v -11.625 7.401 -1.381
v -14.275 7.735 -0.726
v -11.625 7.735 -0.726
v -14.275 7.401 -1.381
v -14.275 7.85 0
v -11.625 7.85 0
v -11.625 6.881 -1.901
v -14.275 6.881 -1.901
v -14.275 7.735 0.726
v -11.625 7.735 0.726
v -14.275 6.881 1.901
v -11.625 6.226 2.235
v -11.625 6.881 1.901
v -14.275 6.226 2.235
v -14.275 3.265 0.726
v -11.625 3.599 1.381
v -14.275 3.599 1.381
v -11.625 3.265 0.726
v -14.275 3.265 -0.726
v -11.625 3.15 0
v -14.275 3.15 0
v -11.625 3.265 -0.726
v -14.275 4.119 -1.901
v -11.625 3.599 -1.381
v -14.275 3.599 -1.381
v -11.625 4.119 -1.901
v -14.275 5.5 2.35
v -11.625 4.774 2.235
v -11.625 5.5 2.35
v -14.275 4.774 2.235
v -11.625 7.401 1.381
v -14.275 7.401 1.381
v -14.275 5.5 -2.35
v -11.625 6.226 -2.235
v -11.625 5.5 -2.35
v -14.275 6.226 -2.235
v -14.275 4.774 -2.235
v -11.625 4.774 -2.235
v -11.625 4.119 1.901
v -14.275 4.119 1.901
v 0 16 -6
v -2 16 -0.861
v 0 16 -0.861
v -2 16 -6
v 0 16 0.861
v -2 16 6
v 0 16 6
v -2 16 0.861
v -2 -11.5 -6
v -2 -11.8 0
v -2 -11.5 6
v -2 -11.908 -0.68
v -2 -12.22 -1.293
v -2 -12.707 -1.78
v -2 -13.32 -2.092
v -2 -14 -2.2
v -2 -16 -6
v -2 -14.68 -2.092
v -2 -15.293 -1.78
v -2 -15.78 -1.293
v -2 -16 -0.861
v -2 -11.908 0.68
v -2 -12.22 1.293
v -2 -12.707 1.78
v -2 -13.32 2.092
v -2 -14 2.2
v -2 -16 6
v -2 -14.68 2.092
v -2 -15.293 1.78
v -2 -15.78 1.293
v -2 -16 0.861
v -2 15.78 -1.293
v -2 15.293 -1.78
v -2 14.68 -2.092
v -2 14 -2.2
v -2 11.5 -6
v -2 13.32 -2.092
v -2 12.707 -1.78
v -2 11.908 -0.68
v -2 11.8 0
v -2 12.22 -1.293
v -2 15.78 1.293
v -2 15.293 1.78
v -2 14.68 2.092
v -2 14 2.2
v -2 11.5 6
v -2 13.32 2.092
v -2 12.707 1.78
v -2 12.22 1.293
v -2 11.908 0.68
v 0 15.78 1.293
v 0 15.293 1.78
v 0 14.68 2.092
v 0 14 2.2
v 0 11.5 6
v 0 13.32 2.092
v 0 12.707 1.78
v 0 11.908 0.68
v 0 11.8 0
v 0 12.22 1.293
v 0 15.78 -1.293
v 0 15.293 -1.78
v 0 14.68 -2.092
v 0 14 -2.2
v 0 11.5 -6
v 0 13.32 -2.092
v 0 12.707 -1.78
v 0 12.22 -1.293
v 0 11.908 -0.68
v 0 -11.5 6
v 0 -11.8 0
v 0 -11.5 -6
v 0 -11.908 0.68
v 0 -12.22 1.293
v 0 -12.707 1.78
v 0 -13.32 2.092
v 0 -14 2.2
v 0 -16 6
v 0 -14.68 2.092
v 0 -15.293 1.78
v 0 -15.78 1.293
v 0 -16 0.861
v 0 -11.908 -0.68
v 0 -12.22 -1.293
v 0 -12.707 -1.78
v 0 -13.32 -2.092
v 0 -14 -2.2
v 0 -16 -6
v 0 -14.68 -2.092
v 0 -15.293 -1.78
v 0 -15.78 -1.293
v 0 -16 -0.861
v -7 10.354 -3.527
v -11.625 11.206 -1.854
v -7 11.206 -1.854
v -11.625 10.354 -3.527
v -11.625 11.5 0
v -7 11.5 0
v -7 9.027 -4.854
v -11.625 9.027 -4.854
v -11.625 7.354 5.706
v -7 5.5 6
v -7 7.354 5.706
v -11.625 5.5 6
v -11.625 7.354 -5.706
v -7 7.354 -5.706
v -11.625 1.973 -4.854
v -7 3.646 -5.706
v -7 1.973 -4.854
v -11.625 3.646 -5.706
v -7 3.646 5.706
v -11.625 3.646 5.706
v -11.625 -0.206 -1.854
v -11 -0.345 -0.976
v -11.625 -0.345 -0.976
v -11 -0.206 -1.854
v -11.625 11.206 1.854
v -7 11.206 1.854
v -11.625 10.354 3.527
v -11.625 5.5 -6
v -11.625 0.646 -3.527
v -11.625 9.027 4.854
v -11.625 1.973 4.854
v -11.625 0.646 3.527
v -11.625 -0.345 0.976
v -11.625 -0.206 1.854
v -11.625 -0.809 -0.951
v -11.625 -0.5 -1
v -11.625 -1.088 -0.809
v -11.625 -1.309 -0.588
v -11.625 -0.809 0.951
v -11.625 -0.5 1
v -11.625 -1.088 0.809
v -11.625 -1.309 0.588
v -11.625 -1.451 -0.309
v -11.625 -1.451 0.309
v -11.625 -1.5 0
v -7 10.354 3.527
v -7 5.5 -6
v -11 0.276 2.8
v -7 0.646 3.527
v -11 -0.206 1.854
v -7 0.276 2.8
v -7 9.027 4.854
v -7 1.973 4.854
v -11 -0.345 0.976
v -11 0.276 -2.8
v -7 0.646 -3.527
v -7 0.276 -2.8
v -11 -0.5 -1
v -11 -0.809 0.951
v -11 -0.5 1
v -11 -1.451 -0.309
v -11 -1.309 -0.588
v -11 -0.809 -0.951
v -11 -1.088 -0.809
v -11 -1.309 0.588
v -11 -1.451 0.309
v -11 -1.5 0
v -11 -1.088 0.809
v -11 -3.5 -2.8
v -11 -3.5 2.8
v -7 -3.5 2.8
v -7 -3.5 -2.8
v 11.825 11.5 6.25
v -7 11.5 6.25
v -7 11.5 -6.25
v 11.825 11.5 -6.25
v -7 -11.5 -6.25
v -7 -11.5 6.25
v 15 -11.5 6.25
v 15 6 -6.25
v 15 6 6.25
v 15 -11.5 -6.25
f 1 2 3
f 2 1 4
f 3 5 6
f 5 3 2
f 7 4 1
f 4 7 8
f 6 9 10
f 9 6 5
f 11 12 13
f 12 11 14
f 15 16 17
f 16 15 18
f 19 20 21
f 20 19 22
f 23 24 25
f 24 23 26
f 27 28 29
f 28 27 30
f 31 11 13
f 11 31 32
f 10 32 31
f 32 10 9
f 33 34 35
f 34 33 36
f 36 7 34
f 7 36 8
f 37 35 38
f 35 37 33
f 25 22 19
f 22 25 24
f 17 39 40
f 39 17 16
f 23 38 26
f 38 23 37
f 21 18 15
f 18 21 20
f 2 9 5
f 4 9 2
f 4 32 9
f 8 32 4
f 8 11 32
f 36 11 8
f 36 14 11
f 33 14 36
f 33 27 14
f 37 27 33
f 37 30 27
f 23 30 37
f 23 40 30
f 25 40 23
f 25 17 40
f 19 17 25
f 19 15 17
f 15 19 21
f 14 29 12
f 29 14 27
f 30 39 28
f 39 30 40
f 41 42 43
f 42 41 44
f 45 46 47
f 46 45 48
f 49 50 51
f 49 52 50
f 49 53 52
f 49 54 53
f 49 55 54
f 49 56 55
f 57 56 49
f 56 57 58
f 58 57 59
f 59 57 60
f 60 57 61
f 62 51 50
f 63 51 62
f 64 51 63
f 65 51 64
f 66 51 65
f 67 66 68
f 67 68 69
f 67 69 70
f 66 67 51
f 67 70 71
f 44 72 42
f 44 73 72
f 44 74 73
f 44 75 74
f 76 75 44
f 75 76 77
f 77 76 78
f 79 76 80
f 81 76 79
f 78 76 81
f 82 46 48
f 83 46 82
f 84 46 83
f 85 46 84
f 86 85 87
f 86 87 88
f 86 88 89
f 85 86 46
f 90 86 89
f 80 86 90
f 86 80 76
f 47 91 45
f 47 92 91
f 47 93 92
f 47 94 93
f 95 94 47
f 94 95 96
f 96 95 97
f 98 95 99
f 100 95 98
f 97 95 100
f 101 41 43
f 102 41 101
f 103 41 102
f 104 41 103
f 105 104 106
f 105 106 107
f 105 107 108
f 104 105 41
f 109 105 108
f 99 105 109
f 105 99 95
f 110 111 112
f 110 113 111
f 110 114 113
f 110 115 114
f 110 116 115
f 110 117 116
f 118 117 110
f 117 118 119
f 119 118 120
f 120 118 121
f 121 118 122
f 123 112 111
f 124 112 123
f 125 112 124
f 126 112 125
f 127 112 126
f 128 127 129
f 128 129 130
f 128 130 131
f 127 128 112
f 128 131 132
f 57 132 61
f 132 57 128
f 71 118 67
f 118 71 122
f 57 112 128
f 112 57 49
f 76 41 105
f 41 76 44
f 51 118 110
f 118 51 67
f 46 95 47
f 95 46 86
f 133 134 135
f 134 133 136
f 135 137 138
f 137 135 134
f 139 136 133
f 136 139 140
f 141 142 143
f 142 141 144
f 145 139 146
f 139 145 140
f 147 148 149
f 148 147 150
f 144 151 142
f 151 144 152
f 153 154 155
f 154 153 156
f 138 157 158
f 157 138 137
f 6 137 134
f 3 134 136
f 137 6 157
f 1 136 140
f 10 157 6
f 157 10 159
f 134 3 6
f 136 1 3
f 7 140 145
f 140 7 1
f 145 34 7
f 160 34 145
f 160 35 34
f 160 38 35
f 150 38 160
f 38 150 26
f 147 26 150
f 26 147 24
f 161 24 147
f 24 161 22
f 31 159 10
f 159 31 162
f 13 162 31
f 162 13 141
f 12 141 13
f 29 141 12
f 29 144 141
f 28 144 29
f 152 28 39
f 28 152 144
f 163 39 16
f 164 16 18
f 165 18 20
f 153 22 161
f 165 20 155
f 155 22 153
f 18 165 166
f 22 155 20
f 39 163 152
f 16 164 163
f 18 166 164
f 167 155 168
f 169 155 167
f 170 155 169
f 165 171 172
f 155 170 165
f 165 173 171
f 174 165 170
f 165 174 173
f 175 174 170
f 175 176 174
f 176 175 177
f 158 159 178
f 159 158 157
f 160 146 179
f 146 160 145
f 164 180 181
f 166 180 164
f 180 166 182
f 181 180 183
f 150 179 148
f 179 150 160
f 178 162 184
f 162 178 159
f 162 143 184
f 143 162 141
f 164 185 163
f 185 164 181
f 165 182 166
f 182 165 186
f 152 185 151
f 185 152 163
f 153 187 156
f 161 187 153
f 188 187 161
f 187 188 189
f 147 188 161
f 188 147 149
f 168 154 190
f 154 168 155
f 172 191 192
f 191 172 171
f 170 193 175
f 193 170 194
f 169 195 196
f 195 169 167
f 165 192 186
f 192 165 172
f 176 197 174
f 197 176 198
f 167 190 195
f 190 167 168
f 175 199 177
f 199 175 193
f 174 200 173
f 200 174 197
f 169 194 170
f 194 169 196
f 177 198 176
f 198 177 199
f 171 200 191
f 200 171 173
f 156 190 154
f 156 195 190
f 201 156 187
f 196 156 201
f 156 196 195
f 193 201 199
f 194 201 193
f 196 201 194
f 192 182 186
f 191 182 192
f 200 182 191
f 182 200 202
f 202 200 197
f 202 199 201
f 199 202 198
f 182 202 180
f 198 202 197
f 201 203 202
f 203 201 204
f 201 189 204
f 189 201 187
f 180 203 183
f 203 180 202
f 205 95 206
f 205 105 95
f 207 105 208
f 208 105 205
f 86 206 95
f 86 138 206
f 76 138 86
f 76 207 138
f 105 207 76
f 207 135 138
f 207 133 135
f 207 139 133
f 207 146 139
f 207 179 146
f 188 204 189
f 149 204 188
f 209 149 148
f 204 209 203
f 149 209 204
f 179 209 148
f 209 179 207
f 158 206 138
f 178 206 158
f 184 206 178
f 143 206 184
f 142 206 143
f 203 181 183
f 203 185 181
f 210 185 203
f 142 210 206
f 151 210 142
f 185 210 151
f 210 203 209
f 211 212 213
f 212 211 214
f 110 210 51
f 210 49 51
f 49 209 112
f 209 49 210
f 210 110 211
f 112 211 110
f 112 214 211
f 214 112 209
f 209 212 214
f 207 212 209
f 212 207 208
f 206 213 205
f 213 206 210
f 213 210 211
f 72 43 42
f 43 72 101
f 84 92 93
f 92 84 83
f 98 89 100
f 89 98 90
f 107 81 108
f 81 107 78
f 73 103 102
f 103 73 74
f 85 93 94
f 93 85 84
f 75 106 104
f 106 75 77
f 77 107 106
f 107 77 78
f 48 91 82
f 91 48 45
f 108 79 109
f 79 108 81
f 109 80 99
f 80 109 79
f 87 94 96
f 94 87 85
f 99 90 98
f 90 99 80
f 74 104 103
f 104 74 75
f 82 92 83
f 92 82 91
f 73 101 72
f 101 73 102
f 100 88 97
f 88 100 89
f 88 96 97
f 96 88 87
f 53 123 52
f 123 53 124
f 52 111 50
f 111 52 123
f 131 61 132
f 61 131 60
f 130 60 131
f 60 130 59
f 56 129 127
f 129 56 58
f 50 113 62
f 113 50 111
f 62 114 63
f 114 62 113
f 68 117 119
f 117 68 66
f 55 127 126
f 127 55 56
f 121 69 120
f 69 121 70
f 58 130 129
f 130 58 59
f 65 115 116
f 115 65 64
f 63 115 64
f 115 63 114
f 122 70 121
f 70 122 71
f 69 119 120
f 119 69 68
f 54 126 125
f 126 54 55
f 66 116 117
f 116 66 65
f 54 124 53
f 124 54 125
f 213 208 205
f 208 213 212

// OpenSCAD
/* 

9G Servo in OpenSCAD by TheCase on Thingiverse: https://www.thingiverse.com/thing:29734

This thing was started by Thingiverse user TheCase, and is licensed under cc.

The origin for the received object is the center of the main block, 
and there was no easy way to determine where to mount the servo and 
install a servo horn.


Usage: 

    use <9g_servo.scad>




*/

* 9g_motor();

function 9g_motor() = 
    let(
        tran_sprkt = [5.5,0,3.65],
        sprkt_h = 29.25,
        tran_sprkt_top = [0, 0, sprkt_h/2],
        tran_mnt = [0,0,5],
        thick_mnt = 2,
        size_mnt = [32,12,thick_mnt],
        size_body = [23,12.5,22],
        offset_sprkt_origin = -(tran_sprkt + tran_sprkt_top),
        offset_mnt = -[0, 0, thick_mnt/2 ],
        tran_mnt_cl =  offset_sprkt_origin + tran_mnt - [0, 0, thick_mnt/2 ]
    ) 
    
[
    [
        ["offset_for_sprocket_origin", offset_sprkt_origin],
        ["mount_cl_bottom_translation", tran_mnt_cl]
    ],
    [
        ["sprocket_translation", tran_sprkt],
        ["sprocket_height", sprkt_h],
        ["mounting_translation", tran_mnt],
        ["mounting_size", size_mnt],
        ["body_size", size_body],
    ]   
];


* 9g_motor_sprocket_at_origin();

module 9g_motor_sprocket_at_origin() {
    offset_for_sprocket_orgin = 9g_motor()[0][0][1];
    tran_mnt_cl = 9g_motor()[0][1][1];
    color("black") translate(tran_mnt_cl) sphere(1);
    color("green", alpha=0.5)  translate(offset_for_sprocket_orgin)  9g_motor();  
}




module 9g_motor_centered_for_mounting() {
    t_mnt = 9g_motor()[1][2][1] ;
    s_mnt = 9g_motor()[1][3][1];
    rotate([-90,0,90]) 
        translate(-t_mnt+[0,0,s_mnt.z/2] ) 9g_motor();  
}

9g_motor_centered_for_mounting();

module 9g_motor(alpha=1){
    body_color = "SteelBlue";
    sprocket_color = "white";
    t_sprkt = 9g_motor()[1][0][1];
    h_sprkt = 9g_motor()[1][1][1];
    t_mnt = 9g_motor()[1][2][1];
    s_mnt = 9g_motor()[1][3][1];
    s_body = 9g_motor()[1][4][1];
    
	difference(){			
		union(){
			color(sprocket_color) translate(t_sprkt) cylinder(r=2.35, h=h_sprkt, $fn=20, center=true);
			color(body_color, alpha=alpha) translate(t_mnt) cube(s_mnt, center=true);
			color(body_color, alpha=alpha) translate([5.5,0,2.75]) cylinder(r=6, h=25.75, $fn=20, center=true);
			color(body_color, alpha=alpha) translate([-.5,0,2.75]) cylinder(r=1, h=25.75, $fn=20, center=true);
			color(body_color, alpha=alpha) translate([-1,0,2.75]) cube([5,5.6,24.5], center=true);		
            color(body_color, alpha=alpha) cube(s_body, center=true);    
		}
		translate([10,0,-11]) rotate([0,-30,0]) cube([8,13,4], center=true);
		for ( hole = [14,-14] ){
			translate([hole,0,5]) cylinder(r=2.2, h=4, $fn=20, center=true);
		}	
	}
}
